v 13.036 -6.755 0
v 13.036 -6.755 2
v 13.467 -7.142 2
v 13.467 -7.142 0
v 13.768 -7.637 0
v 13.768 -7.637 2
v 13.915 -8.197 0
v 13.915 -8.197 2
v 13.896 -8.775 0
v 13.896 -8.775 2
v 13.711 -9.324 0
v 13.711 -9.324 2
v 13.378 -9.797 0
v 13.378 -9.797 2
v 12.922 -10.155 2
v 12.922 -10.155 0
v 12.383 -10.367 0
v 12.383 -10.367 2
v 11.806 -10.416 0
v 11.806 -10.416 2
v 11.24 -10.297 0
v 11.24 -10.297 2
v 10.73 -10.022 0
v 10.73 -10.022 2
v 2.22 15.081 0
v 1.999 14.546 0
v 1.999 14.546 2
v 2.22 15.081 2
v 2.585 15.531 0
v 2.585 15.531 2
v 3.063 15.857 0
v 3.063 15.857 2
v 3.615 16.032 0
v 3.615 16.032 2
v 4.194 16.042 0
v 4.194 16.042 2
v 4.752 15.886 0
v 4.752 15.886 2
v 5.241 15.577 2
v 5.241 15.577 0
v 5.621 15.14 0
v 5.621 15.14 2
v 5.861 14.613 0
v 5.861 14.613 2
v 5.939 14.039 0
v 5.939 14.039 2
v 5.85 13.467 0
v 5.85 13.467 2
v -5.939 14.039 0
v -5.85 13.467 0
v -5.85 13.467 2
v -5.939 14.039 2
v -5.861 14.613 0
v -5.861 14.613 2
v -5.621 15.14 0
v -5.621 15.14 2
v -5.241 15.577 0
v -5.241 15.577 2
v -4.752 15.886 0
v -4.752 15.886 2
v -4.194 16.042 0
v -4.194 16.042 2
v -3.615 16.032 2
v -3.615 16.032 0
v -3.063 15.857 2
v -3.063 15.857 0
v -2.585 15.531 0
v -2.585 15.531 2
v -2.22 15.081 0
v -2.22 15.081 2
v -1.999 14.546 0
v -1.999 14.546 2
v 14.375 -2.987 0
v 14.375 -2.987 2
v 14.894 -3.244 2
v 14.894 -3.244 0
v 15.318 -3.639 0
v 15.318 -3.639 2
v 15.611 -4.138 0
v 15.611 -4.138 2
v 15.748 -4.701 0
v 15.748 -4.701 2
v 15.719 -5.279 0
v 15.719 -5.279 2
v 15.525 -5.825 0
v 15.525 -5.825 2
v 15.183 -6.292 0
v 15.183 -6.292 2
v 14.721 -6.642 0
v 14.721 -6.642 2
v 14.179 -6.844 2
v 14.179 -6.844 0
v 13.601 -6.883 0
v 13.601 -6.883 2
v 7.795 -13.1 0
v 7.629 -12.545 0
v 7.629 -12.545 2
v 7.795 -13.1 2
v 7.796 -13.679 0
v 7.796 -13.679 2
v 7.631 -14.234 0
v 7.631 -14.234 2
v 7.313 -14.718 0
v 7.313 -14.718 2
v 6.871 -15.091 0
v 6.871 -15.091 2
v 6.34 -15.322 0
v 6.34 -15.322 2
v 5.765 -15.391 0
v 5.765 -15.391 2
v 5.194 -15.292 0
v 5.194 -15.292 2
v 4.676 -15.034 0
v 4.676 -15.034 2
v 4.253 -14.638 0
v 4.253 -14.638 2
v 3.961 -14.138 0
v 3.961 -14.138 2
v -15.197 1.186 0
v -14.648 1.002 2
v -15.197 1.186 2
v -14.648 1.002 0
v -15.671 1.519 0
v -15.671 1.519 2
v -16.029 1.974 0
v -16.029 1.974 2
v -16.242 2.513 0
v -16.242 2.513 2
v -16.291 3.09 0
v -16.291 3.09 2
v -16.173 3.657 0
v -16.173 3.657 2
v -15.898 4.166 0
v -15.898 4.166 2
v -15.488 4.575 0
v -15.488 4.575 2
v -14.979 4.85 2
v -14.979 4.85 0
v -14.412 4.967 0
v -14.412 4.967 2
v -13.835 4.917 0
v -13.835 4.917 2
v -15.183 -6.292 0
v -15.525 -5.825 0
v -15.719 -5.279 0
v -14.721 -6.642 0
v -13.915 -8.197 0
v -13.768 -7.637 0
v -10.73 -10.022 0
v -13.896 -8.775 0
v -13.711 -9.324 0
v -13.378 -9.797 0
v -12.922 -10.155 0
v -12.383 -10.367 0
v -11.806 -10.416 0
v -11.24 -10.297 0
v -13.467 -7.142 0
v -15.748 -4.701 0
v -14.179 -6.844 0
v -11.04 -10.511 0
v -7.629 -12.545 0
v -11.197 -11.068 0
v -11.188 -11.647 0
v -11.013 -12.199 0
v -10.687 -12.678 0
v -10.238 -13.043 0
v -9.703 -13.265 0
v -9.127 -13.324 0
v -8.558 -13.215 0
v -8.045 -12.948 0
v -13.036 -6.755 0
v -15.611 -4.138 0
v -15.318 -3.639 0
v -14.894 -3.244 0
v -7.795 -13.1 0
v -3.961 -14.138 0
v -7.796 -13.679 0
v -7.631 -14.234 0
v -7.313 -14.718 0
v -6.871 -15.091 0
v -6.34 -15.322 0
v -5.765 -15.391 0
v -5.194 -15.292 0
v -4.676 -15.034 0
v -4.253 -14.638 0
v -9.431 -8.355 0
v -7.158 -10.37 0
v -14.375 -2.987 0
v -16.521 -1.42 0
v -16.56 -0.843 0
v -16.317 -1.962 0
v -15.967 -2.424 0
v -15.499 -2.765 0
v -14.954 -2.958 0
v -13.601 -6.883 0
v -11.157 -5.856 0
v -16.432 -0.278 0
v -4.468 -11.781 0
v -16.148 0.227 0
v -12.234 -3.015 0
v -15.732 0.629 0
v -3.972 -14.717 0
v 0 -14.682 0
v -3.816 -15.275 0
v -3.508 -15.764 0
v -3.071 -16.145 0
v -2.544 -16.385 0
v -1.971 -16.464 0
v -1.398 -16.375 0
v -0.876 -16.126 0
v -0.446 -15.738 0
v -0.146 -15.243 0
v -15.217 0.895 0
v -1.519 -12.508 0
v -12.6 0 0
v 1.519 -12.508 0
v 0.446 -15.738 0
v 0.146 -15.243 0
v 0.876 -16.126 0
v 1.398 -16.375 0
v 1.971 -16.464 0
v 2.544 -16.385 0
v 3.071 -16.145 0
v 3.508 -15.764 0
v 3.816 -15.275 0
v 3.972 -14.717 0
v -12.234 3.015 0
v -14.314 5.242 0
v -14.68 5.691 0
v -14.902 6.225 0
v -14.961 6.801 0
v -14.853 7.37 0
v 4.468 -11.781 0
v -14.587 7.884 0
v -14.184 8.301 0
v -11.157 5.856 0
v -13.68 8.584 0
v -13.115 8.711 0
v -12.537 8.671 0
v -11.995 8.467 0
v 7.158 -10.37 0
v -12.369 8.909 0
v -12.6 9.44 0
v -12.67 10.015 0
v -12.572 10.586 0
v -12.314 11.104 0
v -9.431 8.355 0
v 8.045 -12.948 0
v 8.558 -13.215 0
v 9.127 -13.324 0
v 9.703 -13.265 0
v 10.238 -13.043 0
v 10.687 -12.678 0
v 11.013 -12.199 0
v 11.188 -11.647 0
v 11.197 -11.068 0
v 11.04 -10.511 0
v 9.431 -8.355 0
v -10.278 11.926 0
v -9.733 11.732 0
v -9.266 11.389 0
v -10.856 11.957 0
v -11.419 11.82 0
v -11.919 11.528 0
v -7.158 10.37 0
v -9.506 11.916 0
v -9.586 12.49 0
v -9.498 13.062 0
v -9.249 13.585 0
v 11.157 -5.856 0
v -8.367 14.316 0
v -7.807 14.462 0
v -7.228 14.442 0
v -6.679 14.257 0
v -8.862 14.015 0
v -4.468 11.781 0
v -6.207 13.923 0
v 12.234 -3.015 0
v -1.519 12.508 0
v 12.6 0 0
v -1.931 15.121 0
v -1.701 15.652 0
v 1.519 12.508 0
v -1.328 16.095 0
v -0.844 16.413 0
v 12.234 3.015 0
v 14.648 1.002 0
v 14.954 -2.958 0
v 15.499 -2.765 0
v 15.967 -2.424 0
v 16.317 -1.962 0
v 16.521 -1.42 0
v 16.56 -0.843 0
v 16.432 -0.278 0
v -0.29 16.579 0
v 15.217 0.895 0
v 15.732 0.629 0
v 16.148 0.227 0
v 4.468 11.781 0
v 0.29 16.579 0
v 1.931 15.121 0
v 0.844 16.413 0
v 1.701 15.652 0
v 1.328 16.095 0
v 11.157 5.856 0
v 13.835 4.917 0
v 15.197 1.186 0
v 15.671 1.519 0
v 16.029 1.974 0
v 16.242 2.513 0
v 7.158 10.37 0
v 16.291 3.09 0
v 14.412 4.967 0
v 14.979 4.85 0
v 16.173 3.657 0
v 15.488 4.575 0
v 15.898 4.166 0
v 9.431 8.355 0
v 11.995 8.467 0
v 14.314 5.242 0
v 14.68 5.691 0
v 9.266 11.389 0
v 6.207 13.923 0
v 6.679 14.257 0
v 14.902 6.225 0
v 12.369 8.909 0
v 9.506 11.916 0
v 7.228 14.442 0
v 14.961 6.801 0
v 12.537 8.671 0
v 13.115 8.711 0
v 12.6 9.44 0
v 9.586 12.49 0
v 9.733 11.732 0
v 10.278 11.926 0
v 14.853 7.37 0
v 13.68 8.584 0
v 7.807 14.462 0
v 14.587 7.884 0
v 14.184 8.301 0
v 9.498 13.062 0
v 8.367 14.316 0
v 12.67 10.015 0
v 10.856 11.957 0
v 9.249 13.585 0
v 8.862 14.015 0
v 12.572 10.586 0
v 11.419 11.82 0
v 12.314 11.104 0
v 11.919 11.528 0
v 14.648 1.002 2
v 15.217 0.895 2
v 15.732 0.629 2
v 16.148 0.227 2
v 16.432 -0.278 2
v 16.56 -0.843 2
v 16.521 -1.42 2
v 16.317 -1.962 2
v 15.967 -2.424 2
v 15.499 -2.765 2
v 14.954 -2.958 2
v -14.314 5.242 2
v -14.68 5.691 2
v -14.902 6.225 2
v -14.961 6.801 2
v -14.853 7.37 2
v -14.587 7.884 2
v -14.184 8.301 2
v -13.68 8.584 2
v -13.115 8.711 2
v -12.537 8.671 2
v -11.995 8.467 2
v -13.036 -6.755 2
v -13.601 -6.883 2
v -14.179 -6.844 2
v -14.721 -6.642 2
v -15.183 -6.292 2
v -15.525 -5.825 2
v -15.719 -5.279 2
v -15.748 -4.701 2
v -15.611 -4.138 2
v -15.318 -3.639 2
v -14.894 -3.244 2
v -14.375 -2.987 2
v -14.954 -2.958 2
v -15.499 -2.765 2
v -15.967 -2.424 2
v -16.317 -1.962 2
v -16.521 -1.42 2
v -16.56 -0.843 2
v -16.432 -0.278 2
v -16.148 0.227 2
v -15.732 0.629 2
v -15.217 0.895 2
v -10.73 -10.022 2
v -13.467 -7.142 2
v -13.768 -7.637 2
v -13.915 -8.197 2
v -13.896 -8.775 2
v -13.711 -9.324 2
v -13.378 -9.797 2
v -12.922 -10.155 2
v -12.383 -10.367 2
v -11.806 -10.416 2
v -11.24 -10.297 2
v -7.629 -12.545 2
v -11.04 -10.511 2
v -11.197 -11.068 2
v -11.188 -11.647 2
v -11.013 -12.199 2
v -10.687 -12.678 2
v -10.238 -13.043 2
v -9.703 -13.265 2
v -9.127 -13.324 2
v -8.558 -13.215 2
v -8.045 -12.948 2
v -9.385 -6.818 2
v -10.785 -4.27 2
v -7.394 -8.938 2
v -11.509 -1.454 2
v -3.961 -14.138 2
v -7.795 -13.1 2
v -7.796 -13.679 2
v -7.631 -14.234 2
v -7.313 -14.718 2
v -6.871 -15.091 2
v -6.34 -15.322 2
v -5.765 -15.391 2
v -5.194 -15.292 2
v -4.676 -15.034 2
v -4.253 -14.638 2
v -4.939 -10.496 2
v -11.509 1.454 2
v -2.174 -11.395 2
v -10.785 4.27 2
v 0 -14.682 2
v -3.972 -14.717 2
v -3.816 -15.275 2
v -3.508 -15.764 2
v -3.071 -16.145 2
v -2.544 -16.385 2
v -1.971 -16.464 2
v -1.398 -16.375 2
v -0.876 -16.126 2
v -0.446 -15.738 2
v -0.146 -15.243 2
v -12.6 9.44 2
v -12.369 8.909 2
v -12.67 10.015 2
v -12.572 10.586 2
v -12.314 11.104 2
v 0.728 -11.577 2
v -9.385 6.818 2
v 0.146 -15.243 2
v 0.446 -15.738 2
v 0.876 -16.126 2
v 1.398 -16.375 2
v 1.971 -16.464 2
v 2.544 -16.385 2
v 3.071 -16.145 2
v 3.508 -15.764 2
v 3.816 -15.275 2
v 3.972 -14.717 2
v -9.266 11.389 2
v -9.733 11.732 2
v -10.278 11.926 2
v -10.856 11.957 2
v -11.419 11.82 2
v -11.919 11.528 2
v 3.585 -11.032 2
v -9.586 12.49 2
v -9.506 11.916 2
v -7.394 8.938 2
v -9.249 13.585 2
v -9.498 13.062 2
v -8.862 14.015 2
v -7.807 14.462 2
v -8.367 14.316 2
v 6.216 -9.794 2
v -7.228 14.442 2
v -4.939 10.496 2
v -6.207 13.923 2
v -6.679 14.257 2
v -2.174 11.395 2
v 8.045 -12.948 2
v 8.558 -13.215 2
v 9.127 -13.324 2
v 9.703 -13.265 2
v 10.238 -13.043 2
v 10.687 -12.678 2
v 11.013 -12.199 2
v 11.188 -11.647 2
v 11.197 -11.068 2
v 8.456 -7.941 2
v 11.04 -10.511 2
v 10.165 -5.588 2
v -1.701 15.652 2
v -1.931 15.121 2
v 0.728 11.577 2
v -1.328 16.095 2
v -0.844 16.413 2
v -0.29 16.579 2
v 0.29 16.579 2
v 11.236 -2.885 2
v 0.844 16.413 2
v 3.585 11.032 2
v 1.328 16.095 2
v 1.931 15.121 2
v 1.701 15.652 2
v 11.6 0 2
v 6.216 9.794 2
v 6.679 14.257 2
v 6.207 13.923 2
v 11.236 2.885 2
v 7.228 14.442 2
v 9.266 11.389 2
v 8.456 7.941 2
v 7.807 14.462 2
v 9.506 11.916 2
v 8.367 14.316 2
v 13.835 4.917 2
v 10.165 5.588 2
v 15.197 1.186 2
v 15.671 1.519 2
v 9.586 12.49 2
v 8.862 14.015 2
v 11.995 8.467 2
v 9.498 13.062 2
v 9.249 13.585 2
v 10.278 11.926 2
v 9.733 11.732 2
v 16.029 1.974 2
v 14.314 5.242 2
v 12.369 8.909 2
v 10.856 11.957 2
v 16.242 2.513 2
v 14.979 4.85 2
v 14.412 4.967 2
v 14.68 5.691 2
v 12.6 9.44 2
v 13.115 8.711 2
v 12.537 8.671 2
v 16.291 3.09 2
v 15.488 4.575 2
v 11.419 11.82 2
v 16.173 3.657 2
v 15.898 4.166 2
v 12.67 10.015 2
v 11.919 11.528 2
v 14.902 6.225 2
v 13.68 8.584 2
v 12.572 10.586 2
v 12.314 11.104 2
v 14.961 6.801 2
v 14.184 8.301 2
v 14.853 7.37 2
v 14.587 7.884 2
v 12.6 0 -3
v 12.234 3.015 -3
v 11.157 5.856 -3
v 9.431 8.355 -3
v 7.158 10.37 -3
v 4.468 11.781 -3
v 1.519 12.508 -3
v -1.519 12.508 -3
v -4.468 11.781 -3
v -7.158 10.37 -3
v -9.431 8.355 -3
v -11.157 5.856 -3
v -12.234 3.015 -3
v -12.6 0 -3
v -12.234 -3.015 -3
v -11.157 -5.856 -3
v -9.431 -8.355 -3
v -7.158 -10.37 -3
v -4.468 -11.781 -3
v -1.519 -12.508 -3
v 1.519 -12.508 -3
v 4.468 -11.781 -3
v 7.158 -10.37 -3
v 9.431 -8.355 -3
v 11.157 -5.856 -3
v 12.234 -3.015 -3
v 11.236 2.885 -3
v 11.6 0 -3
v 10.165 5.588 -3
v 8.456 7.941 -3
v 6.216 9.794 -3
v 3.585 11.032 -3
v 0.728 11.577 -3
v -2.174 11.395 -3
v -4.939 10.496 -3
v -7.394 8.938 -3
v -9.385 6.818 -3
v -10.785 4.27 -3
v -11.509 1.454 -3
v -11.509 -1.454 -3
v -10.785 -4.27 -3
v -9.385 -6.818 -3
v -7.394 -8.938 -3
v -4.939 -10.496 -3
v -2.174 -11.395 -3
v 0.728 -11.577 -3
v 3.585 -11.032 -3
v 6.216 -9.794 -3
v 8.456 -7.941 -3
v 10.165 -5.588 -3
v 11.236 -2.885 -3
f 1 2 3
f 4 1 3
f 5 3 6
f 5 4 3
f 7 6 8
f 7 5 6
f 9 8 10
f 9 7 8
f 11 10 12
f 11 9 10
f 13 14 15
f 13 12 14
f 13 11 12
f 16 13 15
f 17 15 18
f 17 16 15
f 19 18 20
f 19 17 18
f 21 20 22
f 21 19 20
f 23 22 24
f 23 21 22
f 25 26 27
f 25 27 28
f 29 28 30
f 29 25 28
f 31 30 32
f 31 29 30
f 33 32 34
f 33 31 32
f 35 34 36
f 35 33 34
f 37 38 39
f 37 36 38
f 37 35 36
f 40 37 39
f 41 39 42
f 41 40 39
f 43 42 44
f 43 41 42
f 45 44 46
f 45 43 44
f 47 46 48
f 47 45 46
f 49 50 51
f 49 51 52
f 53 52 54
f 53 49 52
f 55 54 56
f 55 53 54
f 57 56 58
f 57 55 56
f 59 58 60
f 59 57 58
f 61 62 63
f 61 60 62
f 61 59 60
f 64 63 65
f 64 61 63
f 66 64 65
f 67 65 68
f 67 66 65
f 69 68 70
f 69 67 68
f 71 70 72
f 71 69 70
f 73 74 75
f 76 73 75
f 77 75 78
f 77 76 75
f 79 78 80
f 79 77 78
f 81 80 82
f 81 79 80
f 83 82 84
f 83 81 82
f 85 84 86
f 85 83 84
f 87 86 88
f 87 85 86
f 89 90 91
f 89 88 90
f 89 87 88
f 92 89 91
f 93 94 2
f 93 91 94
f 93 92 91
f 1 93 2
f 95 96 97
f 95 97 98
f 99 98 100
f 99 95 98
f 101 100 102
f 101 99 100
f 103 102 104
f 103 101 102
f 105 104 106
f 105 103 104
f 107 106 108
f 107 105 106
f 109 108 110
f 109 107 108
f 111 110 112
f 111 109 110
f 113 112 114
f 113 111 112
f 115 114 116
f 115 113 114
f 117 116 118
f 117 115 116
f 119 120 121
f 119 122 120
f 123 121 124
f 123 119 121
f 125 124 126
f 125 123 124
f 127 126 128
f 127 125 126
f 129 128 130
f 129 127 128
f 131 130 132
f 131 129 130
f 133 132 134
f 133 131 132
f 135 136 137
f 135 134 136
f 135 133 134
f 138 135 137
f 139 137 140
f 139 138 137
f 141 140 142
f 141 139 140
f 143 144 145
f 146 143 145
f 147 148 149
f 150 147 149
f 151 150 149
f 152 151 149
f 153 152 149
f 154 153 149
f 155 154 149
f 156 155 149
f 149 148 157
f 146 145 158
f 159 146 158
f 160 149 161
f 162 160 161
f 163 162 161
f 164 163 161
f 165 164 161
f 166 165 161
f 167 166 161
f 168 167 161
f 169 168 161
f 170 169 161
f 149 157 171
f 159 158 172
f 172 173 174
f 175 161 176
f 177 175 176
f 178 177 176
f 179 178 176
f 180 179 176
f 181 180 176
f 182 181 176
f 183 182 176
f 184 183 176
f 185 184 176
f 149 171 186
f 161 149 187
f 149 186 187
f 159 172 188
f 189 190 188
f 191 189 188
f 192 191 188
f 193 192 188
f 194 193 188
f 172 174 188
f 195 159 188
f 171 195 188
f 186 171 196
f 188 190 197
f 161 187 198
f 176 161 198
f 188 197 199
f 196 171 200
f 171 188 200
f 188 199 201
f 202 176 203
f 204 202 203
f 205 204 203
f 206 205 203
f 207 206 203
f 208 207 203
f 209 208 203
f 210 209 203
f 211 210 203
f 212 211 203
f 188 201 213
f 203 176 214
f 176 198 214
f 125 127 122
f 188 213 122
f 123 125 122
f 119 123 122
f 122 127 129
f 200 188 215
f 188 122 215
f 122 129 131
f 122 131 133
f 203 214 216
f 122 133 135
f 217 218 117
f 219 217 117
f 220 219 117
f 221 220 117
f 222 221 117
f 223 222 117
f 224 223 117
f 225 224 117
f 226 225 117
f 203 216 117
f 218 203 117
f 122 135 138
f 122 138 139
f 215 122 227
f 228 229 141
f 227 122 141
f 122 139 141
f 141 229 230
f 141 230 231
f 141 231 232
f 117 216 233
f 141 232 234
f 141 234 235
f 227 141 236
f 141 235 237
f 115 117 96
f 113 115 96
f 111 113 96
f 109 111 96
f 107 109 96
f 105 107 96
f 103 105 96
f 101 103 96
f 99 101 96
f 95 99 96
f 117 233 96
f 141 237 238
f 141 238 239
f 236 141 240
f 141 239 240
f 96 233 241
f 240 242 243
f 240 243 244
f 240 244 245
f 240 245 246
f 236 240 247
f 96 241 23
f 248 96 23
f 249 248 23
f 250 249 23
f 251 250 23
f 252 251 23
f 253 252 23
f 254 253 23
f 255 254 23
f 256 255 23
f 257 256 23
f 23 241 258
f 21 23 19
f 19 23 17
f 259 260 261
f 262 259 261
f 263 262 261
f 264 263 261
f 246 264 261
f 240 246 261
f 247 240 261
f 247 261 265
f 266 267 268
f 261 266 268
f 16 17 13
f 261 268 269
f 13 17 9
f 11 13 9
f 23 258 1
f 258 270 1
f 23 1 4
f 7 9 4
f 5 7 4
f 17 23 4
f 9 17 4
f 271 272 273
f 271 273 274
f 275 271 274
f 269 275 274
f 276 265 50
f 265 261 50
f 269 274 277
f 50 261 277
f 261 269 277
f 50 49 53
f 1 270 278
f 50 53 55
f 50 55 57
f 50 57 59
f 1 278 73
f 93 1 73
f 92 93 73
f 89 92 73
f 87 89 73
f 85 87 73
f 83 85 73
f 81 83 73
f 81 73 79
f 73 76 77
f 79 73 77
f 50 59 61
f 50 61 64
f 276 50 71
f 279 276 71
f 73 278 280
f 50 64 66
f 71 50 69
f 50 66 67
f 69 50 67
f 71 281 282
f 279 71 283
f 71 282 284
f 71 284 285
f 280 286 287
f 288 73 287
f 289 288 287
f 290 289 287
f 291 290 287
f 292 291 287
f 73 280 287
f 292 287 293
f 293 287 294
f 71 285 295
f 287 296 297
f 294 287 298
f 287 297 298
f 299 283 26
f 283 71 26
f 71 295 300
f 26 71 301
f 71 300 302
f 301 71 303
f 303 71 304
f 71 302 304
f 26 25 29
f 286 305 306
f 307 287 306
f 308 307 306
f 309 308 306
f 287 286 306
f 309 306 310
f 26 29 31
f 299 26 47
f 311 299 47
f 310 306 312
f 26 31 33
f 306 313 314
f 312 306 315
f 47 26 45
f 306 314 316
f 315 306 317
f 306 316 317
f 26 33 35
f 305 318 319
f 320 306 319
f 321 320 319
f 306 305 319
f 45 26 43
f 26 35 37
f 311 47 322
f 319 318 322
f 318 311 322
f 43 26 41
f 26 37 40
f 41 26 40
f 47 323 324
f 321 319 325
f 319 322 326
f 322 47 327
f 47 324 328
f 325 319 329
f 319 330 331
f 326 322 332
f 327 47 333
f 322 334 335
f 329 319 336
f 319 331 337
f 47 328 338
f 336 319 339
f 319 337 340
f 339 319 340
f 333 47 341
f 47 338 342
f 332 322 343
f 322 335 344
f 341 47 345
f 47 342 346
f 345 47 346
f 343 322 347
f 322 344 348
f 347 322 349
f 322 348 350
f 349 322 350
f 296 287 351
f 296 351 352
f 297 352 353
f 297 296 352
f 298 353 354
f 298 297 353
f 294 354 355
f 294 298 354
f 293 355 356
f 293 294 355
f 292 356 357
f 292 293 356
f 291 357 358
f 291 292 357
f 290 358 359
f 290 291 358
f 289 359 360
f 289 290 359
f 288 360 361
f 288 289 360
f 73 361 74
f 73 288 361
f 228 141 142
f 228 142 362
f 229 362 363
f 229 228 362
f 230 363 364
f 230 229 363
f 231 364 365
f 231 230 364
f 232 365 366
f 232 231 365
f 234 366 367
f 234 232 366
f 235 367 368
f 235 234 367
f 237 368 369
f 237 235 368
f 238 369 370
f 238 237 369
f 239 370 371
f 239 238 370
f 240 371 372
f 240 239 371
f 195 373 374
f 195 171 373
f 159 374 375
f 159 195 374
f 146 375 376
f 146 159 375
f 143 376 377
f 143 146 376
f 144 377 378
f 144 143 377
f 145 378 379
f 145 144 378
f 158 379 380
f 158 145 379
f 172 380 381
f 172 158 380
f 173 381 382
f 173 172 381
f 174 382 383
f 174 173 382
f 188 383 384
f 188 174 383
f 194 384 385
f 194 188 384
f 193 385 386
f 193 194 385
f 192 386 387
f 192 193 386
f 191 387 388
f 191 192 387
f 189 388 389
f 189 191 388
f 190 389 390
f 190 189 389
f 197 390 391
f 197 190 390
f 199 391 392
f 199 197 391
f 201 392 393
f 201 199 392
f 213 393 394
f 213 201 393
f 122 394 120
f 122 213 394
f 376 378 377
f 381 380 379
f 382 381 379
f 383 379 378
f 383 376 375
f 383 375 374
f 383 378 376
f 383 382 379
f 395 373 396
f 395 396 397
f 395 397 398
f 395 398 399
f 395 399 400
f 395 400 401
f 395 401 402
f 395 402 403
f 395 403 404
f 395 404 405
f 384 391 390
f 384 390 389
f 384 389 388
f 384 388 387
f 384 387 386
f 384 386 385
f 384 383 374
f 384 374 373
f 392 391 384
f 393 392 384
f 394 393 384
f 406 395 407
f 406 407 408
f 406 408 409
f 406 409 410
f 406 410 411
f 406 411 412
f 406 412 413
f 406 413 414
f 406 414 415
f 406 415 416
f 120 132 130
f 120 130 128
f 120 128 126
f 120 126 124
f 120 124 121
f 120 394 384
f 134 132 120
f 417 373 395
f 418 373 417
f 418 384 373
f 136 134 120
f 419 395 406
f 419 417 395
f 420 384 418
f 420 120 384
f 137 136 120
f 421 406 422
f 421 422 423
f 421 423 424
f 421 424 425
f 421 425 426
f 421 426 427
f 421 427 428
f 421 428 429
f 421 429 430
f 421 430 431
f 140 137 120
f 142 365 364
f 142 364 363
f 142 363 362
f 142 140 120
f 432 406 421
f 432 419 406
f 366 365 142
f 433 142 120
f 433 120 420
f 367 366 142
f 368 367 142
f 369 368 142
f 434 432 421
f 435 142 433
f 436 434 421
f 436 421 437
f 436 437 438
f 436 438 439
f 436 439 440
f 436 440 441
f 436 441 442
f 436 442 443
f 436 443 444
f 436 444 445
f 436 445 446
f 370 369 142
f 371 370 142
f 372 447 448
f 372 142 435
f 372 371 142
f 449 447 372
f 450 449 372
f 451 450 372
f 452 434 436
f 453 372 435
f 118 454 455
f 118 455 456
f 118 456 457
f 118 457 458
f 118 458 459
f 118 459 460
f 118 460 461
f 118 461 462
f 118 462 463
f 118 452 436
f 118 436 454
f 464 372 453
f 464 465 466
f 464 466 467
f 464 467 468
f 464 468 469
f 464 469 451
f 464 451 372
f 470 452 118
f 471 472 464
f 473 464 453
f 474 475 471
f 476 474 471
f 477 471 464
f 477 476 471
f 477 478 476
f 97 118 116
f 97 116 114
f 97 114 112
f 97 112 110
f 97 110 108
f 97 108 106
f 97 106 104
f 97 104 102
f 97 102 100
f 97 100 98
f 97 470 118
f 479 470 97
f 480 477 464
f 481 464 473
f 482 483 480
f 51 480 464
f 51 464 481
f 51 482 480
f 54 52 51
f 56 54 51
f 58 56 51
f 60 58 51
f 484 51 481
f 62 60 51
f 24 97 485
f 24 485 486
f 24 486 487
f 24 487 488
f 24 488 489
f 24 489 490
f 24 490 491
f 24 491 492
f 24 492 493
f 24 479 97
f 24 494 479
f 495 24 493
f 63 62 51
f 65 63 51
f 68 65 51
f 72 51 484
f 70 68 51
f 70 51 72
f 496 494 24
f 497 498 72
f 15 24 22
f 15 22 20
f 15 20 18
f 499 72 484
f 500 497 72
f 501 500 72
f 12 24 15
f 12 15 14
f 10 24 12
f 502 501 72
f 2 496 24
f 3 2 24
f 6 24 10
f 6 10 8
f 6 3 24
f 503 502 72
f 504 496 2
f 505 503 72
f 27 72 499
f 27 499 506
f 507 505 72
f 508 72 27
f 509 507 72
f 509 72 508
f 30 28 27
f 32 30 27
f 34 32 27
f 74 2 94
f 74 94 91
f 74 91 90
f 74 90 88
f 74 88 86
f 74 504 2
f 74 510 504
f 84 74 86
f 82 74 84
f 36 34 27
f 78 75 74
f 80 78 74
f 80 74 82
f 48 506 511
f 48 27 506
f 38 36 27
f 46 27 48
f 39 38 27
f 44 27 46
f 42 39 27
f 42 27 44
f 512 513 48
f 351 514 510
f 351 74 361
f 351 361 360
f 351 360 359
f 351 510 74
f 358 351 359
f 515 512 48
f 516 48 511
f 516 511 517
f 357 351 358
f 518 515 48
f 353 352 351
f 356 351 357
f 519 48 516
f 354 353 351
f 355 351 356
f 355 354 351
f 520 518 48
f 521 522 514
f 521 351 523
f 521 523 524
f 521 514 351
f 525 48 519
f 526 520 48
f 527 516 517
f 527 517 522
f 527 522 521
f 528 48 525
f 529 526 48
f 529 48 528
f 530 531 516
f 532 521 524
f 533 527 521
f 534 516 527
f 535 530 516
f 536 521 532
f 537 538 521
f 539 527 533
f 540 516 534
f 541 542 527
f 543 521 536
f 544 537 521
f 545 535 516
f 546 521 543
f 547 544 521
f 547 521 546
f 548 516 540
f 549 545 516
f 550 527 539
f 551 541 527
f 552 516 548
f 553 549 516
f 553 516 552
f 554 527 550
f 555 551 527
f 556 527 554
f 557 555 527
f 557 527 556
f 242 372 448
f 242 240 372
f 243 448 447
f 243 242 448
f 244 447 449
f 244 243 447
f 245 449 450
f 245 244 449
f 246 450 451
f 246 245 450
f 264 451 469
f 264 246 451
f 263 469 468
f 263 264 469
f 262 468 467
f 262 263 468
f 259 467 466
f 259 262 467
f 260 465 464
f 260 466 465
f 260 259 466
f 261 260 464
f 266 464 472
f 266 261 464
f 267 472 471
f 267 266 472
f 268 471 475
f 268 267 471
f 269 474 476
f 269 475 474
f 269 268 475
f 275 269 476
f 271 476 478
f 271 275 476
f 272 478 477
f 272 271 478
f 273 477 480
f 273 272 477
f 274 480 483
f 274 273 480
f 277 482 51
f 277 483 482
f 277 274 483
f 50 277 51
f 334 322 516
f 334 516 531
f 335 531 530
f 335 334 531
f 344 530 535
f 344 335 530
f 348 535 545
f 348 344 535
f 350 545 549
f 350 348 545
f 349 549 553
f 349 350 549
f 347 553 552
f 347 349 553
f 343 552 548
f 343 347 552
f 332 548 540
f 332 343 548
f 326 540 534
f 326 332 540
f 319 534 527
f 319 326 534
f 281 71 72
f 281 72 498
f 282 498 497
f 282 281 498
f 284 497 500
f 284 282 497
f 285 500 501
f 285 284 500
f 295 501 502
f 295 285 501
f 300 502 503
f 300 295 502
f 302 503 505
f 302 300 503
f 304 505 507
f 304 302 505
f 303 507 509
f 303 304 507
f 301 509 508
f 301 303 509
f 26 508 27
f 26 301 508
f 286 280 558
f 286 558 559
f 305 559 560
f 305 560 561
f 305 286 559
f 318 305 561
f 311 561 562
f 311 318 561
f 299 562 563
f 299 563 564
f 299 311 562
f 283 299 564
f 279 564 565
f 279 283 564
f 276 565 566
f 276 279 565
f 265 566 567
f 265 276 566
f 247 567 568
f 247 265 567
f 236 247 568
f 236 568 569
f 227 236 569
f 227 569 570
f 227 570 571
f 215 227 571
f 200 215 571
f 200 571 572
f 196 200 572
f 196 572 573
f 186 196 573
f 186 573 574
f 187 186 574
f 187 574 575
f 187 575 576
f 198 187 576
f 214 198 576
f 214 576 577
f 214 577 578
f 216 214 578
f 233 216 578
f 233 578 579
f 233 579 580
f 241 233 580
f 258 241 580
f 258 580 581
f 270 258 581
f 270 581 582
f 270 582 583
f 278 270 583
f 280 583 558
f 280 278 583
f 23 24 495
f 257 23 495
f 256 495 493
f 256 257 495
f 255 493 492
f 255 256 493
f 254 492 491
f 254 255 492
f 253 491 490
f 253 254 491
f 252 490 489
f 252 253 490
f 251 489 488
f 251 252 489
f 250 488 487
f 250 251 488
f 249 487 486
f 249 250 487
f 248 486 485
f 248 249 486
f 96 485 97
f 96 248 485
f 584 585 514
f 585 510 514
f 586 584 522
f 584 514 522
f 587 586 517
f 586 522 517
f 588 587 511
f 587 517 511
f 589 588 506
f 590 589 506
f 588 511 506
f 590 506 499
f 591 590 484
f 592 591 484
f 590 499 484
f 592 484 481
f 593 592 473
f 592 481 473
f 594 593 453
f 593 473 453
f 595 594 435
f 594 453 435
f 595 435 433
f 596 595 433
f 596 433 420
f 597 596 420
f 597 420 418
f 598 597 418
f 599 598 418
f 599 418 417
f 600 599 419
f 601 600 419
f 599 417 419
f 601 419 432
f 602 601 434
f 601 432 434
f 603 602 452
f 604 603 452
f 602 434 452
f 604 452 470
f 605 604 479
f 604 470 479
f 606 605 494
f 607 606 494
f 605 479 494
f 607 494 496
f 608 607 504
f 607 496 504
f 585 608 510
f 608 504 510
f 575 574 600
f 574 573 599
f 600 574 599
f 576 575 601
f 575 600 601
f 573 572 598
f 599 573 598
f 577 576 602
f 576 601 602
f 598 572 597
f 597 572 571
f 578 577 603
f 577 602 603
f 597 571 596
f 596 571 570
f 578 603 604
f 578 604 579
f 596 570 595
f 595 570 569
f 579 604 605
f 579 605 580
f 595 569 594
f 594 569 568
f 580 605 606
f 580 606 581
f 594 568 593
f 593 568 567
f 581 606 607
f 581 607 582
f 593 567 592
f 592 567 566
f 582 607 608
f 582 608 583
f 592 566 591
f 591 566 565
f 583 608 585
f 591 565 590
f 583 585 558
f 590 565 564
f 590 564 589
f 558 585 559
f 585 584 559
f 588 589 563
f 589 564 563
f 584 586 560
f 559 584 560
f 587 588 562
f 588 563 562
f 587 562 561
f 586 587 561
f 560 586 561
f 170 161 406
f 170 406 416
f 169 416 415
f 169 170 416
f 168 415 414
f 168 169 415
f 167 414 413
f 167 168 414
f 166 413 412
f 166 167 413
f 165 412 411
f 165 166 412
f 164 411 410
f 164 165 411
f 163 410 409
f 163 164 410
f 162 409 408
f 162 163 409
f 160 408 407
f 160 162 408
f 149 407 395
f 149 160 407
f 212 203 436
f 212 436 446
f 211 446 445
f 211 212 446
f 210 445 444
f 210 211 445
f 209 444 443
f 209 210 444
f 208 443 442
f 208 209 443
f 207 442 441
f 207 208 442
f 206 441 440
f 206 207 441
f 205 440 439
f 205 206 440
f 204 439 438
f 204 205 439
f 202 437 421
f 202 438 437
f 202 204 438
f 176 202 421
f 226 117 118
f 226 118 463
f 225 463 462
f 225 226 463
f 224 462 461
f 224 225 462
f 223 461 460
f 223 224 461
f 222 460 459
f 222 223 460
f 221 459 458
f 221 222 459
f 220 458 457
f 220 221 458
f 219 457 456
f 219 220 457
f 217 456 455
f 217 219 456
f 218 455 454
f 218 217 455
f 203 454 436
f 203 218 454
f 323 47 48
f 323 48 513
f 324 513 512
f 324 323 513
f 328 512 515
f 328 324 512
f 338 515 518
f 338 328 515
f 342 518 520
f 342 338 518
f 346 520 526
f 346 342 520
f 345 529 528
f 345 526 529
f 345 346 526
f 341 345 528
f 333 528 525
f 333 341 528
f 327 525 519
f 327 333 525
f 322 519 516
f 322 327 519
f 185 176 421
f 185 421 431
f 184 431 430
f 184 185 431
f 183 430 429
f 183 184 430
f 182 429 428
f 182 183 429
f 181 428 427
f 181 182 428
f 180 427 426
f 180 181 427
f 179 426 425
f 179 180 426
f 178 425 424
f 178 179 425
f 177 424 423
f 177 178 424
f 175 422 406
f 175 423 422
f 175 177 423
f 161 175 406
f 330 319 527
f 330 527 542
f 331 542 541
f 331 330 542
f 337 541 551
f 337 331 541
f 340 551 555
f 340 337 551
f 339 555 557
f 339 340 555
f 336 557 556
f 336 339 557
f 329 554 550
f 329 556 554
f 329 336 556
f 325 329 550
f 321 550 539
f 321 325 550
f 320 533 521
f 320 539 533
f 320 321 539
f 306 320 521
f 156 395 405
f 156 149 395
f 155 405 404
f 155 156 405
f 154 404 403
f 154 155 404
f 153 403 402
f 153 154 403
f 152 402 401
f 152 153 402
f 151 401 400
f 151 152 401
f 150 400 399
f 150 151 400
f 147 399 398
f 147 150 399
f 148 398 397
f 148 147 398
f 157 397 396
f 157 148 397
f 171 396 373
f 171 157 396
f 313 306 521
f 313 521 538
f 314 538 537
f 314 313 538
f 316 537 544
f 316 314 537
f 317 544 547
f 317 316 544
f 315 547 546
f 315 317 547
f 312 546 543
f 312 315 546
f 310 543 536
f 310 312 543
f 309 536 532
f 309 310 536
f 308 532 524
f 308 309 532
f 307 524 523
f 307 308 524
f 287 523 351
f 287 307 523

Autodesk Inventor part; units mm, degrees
ref_plane "YZ Plane" through (0, 0, 0) normal (1, 0, 0) x (0, 1, 0)
ref_plane "XZ Plane" through (0, 0, 0) normal (0, 1, 0) x (-1, 0, 0)
sketch "Sketch1" plane through (0, 0, 0) normal (0, 0, 1) x (1, 0, 0)
  circle A0 centre (0, 0) radius 12.85
  line L0 (16.8, 24.9006) -> (-16.8, 24.9006) projected
  line L1 (-16.8, 24.9006) -> (-16.8, 21.2406) projected
  line L2 (-16.8, 21.2406) -> (-21.2406, 16.8) projected
  line L3 (-21.2406, 16.8) -> (-24.9006, 16.8) projected
  line L4 (-24.9006, 16.8) -> (-24.9006, -16.8) projected
  line L5 (-24.9006, -16.8) -> (-21.2406, -16.8) projected
  line L6 (-21.2406, -16.8) -> (-16.8, -21.2406) projected
  line L7 (-16.8, -21.2406) -> (-16.8, -24.9006) projected
  line L8 (-16.8, -24.9006) -> (16.8, -24.9006) projected
  line L9 (16.8, -24.9006) -> (16.8, -21.2406) projected
  line L10 (16.8, -21.2406) -> (21.2406, -16.8) projected
  line L11 (21.2406, -16.8) -> (24.9006, -16.8) projected
  line L12 (24.9006, -16.8) -> (24.9006, 16.8) projected
  line L13 (24.9006, 16.8) -> (21.2406, 16.8) projected
  line L14 (21.2406, 16.8) -> (16.8, 21.2406) projected
  line L15 (16.8, 21.2406) -> (16.8, 24.9006) projected
  circle A1 centre (0, 0) radius 12.6
  circle A2 centre (0, 0) radius 11.6
  point P0 (0, 0)
  dimension "d0" = 0.25
  dimension "d1" = 1
  dimension "d11" = 25.7
ref_plane "Work Plane1" through (-13.5, -13.5, -4) normal (0, 0, 1) x (1, 0, 0)
extrude "Extrusion1" add sketch "Sketch1" against normal blind 3 contours A1
sketch "Sketch2" plane through (0, 0, 0) normal (0, 0, 1) x (1, 0, 0)
  circle A0 centre (0, 0) radius 11.6 projected
  circle A1 centre (0, 0) radius 14.6
  line L0 (0, -21.12) -> (0, 23.12) construction
  arc A2 (1.9953, 14.463) -> (-1.9953, 14.463) centre (0, 14.6) ccw
  point P0 (0, 0)
  dimension "d4" = 3
  dimension "d5" = 2
extrude "Extrusion2" add sketch "Sketch2" along normal blind 2
pattern_circular "Circular Pattern1" count 23 over 360 about axis through (0, 0, -10) along (0, 0, 1) of "Extrusion2"
properties part number "20_Lens_holder_clamp"
